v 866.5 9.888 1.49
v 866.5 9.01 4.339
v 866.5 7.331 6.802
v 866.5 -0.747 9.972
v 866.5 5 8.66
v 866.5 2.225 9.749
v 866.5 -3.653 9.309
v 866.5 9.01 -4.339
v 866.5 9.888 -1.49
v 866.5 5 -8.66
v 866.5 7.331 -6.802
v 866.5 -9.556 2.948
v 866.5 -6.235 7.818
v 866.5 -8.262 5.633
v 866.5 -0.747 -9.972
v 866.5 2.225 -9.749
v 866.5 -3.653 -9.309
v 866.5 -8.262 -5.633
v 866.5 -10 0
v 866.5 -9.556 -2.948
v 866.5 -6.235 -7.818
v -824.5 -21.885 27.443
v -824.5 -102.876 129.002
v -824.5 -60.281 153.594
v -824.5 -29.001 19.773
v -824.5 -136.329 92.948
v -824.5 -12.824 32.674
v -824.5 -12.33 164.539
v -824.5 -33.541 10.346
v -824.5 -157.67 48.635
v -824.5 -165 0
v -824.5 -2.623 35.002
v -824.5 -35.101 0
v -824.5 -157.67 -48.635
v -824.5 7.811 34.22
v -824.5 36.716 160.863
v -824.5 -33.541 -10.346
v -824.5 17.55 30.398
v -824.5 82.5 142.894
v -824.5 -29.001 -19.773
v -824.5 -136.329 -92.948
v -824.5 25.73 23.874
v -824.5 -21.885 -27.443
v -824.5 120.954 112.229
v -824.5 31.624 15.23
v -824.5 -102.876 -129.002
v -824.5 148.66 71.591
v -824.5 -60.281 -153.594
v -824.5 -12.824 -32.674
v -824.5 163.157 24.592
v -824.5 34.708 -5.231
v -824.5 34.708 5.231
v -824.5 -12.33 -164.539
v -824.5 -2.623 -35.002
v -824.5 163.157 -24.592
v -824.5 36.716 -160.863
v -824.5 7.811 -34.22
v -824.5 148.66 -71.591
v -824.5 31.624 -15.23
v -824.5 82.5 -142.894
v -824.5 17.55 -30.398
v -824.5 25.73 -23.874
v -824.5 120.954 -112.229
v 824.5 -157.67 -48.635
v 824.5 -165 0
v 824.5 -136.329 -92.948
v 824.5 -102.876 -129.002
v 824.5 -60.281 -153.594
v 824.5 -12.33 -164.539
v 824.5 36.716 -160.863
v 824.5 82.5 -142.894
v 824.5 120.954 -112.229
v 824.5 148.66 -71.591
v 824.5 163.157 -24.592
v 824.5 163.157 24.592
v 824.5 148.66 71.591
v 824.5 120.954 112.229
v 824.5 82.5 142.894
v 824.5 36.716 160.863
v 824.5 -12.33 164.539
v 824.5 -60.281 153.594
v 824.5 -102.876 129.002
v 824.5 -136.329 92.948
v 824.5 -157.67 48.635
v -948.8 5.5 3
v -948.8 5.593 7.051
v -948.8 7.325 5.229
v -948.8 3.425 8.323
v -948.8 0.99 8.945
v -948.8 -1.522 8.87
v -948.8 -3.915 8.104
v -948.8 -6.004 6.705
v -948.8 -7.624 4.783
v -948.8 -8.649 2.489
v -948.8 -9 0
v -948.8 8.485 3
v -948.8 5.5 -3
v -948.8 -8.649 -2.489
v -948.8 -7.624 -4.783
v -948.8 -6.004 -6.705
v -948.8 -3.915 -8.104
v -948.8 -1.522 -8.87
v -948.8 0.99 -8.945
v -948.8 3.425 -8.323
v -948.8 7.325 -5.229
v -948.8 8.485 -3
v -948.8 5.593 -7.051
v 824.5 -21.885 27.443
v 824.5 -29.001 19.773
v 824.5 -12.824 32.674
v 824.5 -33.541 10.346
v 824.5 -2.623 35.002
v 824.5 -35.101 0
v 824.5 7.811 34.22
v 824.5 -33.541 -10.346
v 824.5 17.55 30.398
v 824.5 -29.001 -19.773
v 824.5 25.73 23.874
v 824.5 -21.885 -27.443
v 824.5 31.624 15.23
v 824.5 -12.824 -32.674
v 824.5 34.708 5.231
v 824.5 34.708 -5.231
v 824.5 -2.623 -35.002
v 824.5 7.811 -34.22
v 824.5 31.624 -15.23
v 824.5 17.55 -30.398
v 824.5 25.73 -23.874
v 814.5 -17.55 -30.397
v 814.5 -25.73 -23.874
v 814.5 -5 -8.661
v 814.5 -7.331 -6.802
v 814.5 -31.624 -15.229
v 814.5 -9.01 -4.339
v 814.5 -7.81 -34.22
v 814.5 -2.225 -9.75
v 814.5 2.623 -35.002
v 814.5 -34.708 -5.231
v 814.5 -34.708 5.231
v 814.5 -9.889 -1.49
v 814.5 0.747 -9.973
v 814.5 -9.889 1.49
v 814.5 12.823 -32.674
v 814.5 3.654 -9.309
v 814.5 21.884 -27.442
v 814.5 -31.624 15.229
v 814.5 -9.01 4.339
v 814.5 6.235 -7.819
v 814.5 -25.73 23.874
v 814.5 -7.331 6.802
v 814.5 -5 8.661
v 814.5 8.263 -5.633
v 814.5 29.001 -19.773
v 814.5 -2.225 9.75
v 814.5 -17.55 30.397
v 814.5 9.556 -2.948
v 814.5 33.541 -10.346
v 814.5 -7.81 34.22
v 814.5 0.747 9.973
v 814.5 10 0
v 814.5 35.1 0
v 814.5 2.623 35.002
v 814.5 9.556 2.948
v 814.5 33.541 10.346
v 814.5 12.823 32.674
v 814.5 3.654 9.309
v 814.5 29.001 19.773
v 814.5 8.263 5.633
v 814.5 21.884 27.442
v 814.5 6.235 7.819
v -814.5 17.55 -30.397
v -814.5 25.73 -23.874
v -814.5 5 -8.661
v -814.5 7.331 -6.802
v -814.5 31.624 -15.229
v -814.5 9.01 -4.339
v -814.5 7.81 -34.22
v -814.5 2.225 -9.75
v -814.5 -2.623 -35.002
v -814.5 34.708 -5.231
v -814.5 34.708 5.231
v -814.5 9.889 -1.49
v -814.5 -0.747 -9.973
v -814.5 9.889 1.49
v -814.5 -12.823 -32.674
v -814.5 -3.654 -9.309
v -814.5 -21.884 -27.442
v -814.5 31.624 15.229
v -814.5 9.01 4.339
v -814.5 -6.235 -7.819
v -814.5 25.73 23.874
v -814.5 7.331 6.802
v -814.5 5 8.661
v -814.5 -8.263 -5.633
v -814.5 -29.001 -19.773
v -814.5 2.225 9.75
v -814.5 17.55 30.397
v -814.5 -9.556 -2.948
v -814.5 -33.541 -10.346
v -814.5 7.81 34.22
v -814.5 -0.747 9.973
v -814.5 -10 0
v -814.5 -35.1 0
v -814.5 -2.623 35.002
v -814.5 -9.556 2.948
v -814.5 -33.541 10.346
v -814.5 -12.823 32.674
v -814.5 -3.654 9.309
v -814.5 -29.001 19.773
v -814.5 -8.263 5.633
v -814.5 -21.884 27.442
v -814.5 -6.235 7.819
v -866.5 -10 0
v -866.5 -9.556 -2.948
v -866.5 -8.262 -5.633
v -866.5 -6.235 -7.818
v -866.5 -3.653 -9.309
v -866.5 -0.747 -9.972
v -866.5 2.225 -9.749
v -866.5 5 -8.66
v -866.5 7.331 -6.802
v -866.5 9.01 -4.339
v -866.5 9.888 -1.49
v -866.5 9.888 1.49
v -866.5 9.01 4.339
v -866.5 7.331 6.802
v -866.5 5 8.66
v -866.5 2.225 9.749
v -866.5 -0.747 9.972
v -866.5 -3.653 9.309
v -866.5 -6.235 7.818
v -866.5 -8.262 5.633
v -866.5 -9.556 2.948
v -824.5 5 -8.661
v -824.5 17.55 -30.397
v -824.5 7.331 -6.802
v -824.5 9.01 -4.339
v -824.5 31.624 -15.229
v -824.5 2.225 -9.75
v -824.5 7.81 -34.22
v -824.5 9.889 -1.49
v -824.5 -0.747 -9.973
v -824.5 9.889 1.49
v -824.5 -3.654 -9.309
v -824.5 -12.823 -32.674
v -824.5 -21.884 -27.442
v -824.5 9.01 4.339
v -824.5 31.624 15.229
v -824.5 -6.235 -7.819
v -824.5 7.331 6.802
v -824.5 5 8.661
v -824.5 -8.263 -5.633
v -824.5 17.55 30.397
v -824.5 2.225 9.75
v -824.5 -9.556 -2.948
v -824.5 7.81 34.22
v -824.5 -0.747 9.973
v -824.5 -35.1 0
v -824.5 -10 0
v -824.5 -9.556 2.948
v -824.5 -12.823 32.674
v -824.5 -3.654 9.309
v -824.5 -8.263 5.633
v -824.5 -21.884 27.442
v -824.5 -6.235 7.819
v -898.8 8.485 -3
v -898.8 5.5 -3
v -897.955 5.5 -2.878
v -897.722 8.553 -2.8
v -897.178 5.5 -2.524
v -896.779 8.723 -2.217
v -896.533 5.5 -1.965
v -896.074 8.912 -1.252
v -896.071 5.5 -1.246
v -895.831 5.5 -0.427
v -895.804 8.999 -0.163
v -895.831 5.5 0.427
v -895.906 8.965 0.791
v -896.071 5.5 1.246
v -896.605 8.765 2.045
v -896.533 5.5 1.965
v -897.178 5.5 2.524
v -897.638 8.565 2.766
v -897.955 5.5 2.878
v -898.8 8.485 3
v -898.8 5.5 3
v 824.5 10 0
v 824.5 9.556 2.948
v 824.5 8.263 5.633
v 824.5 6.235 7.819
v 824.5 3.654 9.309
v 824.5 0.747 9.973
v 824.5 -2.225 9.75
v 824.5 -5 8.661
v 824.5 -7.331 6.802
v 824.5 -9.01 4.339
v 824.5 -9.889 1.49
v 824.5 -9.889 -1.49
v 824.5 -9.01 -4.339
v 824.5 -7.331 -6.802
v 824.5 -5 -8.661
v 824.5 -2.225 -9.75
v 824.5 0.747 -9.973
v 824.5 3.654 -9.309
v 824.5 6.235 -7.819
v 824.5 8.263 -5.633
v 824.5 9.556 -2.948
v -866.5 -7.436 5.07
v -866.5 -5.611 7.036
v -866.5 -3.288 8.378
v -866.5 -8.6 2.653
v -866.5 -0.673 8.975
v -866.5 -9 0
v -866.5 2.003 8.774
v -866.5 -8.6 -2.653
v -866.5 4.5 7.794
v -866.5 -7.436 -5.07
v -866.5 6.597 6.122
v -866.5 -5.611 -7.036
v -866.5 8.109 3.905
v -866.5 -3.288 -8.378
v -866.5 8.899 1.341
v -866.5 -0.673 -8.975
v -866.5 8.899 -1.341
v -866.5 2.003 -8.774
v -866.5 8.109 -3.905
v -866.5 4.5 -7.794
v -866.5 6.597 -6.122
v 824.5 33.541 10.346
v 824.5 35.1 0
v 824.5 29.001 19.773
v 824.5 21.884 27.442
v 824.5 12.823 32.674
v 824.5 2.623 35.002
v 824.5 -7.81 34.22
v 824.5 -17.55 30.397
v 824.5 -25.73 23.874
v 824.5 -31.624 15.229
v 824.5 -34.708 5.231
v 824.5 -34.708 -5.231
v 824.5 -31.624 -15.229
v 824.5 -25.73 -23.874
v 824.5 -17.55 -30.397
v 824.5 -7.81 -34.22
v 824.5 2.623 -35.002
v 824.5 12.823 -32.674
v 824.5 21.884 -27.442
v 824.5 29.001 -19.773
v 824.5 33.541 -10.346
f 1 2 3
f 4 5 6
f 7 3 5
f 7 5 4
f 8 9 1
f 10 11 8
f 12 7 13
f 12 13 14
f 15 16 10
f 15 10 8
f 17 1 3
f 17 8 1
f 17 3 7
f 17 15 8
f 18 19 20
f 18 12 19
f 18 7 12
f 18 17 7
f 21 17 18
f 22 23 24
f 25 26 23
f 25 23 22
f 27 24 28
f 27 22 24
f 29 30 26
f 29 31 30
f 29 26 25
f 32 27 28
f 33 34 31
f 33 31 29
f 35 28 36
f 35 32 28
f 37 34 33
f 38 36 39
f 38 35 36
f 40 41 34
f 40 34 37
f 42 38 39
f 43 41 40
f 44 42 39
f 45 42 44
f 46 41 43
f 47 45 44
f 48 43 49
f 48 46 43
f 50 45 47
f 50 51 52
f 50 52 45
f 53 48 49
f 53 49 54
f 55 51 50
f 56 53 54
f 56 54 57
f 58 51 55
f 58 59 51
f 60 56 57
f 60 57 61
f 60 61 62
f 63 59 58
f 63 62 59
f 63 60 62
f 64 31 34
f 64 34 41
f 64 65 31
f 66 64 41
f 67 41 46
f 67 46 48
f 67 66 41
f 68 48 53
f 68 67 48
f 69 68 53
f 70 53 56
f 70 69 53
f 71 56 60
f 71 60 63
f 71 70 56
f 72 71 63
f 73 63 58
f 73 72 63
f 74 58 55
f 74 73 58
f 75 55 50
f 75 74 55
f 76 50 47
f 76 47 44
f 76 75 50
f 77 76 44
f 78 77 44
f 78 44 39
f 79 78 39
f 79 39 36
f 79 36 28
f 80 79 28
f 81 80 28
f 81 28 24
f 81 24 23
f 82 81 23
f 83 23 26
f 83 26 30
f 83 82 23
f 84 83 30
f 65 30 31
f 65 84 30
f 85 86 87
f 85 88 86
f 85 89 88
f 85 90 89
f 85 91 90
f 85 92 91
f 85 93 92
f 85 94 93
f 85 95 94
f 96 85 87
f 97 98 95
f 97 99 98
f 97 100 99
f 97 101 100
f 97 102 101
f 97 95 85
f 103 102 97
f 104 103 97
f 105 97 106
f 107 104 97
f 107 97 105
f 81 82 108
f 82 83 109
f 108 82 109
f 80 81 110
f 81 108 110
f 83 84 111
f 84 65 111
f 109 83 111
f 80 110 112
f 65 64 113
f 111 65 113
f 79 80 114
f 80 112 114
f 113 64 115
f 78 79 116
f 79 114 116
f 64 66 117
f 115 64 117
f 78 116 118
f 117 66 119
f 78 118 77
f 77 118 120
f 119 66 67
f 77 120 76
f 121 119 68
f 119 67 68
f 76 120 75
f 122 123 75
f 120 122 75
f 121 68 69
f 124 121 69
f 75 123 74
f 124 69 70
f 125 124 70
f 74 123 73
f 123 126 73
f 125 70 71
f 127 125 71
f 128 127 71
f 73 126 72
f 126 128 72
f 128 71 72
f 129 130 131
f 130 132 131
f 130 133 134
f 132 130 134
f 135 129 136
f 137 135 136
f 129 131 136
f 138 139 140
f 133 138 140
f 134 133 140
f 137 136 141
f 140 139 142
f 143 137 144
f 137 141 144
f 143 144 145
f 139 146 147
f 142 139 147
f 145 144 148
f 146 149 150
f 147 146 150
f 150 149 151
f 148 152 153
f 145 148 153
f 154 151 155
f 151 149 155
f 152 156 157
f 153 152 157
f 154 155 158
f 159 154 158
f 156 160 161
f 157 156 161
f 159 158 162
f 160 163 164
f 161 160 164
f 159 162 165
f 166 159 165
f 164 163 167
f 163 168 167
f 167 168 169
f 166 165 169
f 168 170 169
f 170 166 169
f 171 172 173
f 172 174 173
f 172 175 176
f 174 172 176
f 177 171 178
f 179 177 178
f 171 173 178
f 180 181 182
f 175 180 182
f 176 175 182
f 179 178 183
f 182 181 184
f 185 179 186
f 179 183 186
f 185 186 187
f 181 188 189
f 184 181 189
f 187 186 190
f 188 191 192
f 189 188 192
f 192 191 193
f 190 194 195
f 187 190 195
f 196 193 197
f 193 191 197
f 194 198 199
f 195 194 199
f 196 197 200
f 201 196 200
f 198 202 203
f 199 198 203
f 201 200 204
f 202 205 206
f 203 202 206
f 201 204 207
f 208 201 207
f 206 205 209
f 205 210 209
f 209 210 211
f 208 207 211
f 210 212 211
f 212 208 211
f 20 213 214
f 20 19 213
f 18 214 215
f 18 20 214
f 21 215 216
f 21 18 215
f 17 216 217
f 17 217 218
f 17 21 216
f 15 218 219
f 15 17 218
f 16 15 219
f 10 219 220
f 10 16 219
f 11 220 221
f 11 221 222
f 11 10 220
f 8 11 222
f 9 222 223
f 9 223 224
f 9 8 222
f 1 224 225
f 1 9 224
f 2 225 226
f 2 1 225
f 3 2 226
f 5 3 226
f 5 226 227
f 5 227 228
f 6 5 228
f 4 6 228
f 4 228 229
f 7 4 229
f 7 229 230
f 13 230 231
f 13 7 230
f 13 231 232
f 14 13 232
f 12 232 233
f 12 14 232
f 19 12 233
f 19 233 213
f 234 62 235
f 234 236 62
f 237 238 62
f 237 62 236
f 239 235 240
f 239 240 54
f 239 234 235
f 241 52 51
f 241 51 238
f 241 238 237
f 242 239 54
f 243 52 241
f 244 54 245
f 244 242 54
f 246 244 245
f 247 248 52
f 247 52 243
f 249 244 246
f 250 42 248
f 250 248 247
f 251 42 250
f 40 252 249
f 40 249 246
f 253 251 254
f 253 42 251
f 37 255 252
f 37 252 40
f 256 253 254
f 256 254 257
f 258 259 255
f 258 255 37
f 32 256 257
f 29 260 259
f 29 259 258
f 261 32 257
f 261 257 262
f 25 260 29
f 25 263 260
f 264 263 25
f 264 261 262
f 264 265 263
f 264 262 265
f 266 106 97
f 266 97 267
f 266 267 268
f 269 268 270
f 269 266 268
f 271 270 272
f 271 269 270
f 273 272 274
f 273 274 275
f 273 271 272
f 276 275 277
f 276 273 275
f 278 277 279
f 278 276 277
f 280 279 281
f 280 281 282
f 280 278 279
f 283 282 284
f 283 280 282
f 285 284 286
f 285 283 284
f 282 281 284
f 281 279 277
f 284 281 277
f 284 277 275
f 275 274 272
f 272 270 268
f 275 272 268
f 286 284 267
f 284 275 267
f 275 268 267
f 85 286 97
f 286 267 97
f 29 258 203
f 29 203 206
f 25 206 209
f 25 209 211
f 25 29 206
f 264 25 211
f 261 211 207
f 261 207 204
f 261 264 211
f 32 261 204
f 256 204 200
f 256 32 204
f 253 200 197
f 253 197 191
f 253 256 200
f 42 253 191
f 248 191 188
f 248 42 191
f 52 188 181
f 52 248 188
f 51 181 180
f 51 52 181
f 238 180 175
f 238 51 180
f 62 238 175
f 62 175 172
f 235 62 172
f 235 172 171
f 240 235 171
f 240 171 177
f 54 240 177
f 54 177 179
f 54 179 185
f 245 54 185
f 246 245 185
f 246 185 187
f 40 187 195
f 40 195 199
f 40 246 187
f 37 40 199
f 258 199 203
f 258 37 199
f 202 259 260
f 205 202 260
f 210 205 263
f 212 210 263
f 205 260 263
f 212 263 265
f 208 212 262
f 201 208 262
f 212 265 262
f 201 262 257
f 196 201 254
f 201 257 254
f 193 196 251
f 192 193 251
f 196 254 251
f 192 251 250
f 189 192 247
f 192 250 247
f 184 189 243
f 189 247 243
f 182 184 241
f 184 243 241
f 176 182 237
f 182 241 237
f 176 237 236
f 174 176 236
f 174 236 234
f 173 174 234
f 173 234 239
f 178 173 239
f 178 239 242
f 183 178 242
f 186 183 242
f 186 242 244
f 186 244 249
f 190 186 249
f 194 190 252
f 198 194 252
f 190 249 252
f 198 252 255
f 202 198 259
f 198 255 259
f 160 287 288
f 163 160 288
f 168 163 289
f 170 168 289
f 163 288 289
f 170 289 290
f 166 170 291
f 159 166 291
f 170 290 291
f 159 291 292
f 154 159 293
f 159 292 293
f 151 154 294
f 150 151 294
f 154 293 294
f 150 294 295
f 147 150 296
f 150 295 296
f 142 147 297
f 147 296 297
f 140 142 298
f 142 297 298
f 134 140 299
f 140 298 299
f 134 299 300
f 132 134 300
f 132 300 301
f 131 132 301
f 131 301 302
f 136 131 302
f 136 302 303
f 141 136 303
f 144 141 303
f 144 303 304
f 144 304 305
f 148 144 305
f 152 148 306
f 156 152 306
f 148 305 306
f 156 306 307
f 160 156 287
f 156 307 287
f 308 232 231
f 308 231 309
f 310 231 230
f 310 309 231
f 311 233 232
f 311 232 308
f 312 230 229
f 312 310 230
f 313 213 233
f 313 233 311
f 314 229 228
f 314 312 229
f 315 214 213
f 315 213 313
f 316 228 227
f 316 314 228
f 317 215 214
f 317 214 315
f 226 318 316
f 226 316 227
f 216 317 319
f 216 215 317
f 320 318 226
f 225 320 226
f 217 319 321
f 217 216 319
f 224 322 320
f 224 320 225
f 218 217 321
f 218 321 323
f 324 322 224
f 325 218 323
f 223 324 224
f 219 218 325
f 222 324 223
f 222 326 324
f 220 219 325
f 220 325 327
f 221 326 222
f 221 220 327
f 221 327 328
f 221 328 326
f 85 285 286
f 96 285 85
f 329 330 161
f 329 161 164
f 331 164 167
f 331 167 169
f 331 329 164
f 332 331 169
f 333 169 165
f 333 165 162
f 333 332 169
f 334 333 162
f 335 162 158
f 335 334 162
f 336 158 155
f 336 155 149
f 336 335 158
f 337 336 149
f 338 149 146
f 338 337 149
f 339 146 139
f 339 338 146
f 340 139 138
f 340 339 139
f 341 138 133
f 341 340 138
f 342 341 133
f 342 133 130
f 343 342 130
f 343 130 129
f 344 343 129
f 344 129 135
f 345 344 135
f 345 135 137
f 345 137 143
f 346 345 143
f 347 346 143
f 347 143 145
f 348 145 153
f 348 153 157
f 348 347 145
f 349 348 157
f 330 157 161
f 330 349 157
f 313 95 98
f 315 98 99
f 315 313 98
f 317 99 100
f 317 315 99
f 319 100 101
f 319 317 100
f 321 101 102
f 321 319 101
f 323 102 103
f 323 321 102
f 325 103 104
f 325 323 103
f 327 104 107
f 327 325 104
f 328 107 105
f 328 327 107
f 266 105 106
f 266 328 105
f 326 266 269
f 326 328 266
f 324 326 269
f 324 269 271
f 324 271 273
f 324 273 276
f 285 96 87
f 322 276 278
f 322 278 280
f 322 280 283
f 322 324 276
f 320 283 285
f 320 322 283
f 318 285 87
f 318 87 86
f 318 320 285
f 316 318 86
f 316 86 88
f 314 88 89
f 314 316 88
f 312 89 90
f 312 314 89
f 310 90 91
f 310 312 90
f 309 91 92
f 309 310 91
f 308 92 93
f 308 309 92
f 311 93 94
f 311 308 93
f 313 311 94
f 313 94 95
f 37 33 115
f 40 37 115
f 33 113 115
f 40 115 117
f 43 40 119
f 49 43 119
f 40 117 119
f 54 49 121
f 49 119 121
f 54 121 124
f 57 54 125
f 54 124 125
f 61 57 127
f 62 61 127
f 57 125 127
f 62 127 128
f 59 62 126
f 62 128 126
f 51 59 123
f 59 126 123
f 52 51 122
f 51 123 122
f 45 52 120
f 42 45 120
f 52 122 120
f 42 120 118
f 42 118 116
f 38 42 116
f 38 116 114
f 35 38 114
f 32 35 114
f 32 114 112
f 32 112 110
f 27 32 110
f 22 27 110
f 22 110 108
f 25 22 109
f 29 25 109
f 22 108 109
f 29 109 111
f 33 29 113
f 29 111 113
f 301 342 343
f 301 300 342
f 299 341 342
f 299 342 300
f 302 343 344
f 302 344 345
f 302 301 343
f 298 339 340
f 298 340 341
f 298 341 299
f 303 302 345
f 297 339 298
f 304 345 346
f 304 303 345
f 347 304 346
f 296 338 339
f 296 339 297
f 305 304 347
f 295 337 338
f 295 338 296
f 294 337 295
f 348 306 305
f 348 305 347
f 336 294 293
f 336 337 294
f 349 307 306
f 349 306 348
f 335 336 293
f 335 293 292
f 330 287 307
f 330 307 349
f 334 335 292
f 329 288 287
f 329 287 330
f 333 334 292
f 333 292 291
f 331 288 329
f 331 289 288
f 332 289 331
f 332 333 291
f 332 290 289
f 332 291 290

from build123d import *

# Parameters (mm, degrees)
SKETCH1_W           = 1649
SKETCH1_H           = 129.8995
SKETCH2_R           = 35.1
SKETCH2_R_2         = 10.0005
BOSS_EXTRUDE1_DEPTH = 10
SKETCH3_R           = 35.1
SKETCH3_R_2         = 10.0005
BOSS_EXTRUDE2_DEPTH = 10
CUT_EXTRUDE1_DEPTH  = 3.5


with BuildPart() as part:
    # Sketch1 → Revolve1 (revolve)
    with BuildSketch(Plane.XY, mode=Mode.PRIVATE) as revolve1_sk:
        with Locations((0, 100.05025)):
            Rectangle(SKETCH1_W, SKETCH1_H)
    revolve(revolve1_sk.sketch.rotate(Axis((-824.5, 0, 0), (1, 0, 0)), 180), axis=Axis((-824.5, 0, 0), (1, 0, 0)))


with BuildPart() as body_2:
    # Sketch2 → Boss-Extrude1 (new body)
    with BuildSketch(Plane.ZY.offset(824.5)):
        with Locations(Location((0, 0, 0), (0, 0, 270))):
            Circle(SKETCH2_R)
        with Locations(Location((0, 0, 0), (0, 0, 270))):
            Circle(SKETCH2_R_2, mode=Mode.SUBTRACT)
    extrude(amount=-BOSS_EXTRUDE1_DEPTH)


with BuildPart() as body_3:
    # Sketch3 → Boss-Extrude2 (new body)
    with BuildSketch(Plane(origin=(824.5, 0, 0), x_dir=(0, 0, -1), z_dir=(1, 0, 0))):
        with Locations(Location((0, 0, 0), (0, 0, 90))):
            Circle(SKETCH3_R)
        with Locations(Location((0, 0, 0), (0, 0, 90))):
            Circle(SKETCH3_R_2, mode=Mode.SUBTRACT)
    extrude(amount=-BOSS_EXTRUDE2_DEPTH)


with BuildPart() as body_4:
    # Sketch4 → Revolve3 (revolve)
    with BuildSketch(Plane.XY, mode=Mode.PRIVATE) as revolve3_sk:
        Polygon((-866.5, 10), (866.5, 10), (866.5, 0), (-948.8, 0), (-948.8, 9), (-866.5, 9), align=None)
    revolve(revolve3_sk.sketch.rotate(Axis((-948.8, 0, 0), (1, 0, 0)), 180), axis=Axis((-948.8, 0, 0), (1, 0, 0)))

    # Sketch5 → Cut-Extrude1 (cut)
    with BuildSketch(Plane(origin=(0, 9, 0), x_dir=(1, 0, 0), z_dir=(0, 1, 0))):
        with BuildLine():
            Line((-948.8, 3), (-898.8, 3))
            ThreePointArc((-898.8, 3), (-895.8, 0), (-898.8, -3))
            Line((-898.8, -3), (-948.8, -3))
            Line((-948.8, -3), (-948.8, 3))
        make_face()
    extrude(amount=-CUT_EXTRUDE1_DEPTH, mode=Mode.SUBTRACT)


solid = Compound([part.part, body_2.part, body_3.part, body_4.part])
